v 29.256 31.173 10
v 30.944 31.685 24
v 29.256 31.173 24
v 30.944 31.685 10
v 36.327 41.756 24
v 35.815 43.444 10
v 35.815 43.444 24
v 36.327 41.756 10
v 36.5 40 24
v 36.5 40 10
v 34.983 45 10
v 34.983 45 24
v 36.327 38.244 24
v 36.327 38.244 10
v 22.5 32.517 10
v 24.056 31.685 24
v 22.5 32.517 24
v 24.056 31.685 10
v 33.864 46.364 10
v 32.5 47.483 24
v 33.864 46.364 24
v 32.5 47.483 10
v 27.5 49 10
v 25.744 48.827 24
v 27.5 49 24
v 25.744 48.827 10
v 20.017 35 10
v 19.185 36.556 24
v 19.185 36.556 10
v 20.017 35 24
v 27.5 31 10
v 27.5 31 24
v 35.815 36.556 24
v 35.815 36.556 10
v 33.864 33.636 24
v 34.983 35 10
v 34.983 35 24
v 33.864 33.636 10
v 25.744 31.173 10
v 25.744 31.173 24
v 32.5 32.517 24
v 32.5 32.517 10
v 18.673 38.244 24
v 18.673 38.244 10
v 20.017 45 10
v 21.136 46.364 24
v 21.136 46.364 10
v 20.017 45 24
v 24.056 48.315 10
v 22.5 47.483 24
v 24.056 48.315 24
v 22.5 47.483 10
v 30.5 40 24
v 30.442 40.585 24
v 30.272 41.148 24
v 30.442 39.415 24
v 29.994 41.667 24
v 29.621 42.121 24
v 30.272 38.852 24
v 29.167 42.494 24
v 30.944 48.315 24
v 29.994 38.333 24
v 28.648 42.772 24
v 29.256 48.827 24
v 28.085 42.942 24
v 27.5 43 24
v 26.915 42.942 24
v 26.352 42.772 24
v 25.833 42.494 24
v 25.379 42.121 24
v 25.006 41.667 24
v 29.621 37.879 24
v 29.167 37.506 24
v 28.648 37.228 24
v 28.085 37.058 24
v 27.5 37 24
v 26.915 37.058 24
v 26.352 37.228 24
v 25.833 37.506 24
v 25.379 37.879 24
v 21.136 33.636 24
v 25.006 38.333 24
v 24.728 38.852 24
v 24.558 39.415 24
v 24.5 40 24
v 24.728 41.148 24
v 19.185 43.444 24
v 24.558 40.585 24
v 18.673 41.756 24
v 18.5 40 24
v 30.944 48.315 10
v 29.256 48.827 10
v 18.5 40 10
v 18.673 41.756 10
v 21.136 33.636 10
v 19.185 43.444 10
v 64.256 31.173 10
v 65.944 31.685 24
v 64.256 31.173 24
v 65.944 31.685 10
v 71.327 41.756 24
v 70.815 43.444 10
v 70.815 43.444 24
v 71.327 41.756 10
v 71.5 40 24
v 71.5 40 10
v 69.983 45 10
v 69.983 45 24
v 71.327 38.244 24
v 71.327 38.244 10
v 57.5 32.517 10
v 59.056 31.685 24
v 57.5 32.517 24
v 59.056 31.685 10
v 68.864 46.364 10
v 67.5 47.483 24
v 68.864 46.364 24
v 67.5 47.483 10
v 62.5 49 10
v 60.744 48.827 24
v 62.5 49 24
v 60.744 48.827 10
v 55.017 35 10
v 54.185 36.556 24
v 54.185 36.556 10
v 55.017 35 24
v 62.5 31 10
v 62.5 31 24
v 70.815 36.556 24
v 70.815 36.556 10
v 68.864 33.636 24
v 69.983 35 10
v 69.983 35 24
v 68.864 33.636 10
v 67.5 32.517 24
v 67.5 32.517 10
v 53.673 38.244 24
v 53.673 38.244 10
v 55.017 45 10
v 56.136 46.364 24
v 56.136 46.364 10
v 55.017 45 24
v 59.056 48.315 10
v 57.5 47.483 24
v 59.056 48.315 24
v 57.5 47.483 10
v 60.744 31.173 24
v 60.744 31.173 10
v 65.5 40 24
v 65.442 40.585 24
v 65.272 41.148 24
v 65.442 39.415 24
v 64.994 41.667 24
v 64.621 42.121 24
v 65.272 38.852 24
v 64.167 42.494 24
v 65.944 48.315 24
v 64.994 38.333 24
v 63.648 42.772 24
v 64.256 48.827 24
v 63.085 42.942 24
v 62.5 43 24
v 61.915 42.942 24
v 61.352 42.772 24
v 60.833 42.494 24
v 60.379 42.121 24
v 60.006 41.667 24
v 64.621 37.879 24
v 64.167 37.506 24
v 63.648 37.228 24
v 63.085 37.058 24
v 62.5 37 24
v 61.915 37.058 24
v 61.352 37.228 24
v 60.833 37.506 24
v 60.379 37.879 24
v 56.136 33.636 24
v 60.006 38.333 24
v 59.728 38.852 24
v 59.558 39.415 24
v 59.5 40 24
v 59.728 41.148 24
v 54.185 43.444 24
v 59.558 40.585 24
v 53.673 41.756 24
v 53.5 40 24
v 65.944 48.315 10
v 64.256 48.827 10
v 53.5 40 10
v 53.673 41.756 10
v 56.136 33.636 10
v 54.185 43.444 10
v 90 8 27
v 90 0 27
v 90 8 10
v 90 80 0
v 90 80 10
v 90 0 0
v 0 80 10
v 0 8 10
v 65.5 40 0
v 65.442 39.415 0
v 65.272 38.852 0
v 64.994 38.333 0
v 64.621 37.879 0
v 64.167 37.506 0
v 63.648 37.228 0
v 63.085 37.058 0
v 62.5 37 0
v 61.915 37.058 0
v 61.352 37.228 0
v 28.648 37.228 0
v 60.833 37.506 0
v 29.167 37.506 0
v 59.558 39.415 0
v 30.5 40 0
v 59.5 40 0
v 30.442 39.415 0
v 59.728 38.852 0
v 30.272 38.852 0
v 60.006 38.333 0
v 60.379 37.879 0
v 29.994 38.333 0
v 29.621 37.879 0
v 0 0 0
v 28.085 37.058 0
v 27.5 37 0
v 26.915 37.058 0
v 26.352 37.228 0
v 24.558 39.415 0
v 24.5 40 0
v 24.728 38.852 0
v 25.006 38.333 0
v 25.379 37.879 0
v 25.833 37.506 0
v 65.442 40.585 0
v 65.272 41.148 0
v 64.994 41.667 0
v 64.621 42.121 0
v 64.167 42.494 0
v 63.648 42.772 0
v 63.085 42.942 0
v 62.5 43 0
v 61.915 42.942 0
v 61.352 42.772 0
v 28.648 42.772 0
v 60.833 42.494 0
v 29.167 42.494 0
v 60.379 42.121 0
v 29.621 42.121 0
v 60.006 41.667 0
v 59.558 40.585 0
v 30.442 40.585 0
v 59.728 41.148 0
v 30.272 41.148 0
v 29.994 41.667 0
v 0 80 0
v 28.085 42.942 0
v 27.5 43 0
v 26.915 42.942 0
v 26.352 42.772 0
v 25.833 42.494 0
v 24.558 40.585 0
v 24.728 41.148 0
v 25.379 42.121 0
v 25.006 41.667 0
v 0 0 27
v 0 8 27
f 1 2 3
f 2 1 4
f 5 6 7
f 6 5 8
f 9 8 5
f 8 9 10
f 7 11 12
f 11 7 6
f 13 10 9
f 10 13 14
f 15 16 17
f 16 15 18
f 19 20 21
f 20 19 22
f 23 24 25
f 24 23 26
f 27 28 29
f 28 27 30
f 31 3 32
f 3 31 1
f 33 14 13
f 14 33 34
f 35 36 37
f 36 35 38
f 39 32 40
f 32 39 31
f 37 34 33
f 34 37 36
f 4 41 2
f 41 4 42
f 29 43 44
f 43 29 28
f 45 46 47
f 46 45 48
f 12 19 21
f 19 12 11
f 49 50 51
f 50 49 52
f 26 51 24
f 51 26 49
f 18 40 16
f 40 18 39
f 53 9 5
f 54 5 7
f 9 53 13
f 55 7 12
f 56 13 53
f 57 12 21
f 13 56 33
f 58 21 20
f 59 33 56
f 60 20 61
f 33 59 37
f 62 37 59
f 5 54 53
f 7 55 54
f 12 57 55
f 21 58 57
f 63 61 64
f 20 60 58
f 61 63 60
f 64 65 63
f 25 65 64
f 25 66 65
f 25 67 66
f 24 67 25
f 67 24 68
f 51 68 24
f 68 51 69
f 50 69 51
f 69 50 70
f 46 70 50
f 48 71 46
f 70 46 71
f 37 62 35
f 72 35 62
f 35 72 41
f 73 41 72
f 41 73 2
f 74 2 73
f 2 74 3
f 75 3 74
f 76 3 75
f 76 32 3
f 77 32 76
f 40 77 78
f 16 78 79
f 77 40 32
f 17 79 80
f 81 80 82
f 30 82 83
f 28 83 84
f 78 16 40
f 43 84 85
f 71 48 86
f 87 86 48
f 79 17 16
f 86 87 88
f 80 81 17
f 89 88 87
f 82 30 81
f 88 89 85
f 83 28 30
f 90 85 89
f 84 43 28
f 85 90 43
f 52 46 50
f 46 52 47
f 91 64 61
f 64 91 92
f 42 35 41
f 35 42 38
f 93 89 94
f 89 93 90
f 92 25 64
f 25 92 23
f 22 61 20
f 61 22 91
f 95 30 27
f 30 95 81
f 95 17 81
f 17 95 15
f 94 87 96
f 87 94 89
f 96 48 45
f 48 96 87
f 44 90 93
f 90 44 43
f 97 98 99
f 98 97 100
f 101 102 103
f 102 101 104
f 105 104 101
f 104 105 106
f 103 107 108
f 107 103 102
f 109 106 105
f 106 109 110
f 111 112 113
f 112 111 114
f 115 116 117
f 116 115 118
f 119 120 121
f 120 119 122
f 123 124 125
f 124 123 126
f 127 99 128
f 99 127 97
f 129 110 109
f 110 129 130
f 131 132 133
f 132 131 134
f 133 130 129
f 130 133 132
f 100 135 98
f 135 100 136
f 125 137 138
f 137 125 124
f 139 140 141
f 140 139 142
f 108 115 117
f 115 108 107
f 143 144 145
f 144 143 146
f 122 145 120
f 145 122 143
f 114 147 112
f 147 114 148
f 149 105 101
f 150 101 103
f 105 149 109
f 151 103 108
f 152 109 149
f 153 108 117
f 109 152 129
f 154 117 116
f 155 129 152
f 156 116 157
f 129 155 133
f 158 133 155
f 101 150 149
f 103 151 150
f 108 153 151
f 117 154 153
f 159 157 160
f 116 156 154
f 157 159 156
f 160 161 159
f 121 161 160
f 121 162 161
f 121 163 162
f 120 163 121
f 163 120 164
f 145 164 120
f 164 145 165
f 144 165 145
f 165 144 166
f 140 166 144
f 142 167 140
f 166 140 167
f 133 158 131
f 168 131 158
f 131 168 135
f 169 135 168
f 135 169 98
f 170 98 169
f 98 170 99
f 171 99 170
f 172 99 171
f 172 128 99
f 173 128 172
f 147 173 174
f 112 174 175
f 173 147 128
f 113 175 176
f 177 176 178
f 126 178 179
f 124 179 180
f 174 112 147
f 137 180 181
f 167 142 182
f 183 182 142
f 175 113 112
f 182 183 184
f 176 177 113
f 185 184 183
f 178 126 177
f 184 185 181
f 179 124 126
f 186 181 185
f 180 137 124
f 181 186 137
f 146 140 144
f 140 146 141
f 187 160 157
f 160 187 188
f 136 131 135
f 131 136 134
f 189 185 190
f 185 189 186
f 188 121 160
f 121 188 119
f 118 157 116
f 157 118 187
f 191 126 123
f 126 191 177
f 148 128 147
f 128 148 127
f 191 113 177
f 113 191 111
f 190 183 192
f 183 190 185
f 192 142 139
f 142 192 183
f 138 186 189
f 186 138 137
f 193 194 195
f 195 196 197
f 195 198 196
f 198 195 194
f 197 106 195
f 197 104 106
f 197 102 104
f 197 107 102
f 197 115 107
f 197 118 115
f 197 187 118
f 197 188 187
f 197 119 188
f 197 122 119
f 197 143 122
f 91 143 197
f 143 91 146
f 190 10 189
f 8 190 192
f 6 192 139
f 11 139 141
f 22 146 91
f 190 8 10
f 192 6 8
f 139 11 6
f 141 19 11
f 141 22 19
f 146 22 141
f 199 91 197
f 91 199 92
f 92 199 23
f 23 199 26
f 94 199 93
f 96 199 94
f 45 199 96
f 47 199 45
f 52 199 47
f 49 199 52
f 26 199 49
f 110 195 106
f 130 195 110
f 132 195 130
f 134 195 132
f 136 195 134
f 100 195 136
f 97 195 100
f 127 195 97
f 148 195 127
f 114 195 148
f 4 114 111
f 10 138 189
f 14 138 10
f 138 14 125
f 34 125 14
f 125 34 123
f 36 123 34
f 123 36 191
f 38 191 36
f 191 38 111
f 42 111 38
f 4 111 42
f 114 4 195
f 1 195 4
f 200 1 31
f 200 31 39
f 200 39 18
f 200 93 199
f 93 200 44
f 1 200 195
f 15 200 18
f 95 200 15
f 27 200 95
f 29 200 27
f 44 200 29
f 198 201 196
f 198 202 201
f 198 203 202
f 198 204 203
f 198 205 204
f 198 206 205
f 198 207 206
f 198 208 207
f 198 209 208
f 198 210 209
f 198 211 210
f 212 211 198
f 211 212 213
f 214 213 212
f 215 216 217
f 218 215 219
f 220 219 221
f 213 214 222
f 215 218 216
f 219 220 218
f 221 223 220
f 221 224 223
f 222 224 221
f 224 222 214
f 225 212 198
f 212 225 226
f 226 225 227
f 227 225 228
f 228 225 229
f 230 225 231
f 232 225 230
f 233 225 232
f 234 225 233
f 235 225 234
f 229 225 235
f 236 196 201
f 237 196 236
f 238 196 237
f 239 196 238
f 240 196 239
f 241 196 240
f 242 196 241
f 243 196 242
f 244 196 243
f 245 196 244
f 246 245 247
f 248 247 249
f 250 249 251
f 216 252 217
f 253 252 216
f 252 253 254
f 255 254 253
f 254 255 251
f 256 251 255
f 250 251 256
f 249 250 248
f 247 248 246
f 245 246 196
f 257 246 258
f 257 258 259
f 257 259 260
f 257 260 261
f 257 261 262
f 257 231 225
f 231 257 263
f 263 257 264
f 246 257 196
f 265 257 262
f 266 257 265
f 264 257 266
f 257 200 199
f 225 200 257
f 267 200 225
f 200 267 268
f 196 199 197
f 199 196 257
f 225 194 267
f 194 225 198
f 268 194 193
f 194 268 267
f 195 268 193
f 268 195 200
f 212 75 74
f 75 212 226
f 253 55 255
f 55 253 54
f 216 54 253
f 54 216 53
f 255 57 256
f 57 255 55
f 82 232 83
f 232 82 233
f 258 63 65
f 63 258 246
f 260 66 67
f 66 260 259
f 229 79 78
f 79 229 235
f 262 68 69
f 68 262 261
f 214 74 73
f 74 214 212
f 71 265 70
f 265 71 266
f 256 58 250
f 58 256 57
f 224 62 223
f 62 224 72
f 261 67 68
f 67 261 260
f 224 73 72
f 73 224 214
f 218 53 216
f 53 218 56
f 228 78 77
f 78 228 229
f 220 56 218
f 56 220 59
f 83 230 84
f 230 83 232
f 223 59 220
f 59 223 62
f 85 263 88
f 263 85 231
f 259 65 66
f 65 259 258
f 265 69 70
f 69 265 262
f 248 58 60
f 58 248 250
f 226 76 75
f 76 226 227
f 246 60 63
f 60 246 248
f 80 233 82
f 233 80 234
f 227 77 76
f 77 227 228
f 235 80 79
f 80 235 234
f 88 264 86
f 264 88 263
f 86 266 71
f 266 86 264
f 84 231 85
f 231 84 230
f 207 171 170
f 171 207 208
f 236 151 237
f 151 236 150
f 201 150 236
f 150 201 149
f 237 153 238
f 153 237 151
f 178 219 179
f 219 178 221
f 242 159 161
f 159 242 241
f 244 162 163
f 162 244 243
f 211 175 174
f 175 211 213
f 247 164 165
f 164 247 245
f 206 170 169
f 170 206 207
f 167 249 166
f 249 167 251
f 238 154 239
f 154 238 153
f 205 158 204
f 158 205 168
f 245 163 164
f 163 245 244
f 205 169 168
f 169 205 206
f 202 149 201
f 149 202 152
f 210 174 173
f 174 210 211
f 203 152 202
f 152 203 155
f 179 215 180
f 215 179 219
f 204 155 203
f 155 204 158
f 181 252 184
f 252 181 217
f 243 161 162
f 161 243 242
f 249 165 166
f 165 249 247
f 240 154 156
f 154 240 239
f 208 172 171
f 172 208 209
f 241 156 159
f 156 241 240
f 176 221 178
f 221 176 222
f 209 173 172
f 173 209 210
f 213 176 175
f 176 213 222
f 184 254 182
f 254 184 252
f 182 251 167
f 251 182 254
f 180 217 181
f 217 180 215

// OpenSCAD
$fn = 32;

// ----------------------------------------------------------------------
// Drill jig: fence jig
// ----------------------------------------------------------------------

// --- parameters (mm) ---
plate_l = 90;             // plate length, X
plate_w = 80;             // plate width, Y
plate_t = 10;             // plate thickness
boss_d = 18;              // guide boss diameter
boss_h = 15;              // boss height above the plate
guide_d = 6;              // guide hole diameter
boss_pitch = 35;          // boss pitch
fence_h = 18;             // fence height above the plate
fence_t = 8;              // fence thickness

n_boss = 2;  // guide bosses
boss_x0 = (plate_l - (n_boss - 1) * boss_pitch) / 2;  // first boss X
boss_top = plate_t - 1 + boss_h;  // boss crown height
fence_top = plate_t - 1 + fence_h;  // fence crown height
total_h = max([fence_top, boss_top]);  // overall height

difference() {
  union() {
  cube([plate_l, plate_w, plate_t]);
  for (i = [0 : n_boss - 1])
    translate([boss_x0 + i * boss_pitch, plate_w / 2, plate_t - 1])
      cylinder(h = boss_h, d = boss_d);
  translate([0, 0, plate_t - 1]) cube([plate_l, fence_t, fence_h]);
  }
  for (i = [0 : n_boss - 1])
    translate([boss_x0 + i * boss_pitch, plate_w / 2, -1])
      cylinder(h = plate_t + boss_h, d = guide_d);
}
